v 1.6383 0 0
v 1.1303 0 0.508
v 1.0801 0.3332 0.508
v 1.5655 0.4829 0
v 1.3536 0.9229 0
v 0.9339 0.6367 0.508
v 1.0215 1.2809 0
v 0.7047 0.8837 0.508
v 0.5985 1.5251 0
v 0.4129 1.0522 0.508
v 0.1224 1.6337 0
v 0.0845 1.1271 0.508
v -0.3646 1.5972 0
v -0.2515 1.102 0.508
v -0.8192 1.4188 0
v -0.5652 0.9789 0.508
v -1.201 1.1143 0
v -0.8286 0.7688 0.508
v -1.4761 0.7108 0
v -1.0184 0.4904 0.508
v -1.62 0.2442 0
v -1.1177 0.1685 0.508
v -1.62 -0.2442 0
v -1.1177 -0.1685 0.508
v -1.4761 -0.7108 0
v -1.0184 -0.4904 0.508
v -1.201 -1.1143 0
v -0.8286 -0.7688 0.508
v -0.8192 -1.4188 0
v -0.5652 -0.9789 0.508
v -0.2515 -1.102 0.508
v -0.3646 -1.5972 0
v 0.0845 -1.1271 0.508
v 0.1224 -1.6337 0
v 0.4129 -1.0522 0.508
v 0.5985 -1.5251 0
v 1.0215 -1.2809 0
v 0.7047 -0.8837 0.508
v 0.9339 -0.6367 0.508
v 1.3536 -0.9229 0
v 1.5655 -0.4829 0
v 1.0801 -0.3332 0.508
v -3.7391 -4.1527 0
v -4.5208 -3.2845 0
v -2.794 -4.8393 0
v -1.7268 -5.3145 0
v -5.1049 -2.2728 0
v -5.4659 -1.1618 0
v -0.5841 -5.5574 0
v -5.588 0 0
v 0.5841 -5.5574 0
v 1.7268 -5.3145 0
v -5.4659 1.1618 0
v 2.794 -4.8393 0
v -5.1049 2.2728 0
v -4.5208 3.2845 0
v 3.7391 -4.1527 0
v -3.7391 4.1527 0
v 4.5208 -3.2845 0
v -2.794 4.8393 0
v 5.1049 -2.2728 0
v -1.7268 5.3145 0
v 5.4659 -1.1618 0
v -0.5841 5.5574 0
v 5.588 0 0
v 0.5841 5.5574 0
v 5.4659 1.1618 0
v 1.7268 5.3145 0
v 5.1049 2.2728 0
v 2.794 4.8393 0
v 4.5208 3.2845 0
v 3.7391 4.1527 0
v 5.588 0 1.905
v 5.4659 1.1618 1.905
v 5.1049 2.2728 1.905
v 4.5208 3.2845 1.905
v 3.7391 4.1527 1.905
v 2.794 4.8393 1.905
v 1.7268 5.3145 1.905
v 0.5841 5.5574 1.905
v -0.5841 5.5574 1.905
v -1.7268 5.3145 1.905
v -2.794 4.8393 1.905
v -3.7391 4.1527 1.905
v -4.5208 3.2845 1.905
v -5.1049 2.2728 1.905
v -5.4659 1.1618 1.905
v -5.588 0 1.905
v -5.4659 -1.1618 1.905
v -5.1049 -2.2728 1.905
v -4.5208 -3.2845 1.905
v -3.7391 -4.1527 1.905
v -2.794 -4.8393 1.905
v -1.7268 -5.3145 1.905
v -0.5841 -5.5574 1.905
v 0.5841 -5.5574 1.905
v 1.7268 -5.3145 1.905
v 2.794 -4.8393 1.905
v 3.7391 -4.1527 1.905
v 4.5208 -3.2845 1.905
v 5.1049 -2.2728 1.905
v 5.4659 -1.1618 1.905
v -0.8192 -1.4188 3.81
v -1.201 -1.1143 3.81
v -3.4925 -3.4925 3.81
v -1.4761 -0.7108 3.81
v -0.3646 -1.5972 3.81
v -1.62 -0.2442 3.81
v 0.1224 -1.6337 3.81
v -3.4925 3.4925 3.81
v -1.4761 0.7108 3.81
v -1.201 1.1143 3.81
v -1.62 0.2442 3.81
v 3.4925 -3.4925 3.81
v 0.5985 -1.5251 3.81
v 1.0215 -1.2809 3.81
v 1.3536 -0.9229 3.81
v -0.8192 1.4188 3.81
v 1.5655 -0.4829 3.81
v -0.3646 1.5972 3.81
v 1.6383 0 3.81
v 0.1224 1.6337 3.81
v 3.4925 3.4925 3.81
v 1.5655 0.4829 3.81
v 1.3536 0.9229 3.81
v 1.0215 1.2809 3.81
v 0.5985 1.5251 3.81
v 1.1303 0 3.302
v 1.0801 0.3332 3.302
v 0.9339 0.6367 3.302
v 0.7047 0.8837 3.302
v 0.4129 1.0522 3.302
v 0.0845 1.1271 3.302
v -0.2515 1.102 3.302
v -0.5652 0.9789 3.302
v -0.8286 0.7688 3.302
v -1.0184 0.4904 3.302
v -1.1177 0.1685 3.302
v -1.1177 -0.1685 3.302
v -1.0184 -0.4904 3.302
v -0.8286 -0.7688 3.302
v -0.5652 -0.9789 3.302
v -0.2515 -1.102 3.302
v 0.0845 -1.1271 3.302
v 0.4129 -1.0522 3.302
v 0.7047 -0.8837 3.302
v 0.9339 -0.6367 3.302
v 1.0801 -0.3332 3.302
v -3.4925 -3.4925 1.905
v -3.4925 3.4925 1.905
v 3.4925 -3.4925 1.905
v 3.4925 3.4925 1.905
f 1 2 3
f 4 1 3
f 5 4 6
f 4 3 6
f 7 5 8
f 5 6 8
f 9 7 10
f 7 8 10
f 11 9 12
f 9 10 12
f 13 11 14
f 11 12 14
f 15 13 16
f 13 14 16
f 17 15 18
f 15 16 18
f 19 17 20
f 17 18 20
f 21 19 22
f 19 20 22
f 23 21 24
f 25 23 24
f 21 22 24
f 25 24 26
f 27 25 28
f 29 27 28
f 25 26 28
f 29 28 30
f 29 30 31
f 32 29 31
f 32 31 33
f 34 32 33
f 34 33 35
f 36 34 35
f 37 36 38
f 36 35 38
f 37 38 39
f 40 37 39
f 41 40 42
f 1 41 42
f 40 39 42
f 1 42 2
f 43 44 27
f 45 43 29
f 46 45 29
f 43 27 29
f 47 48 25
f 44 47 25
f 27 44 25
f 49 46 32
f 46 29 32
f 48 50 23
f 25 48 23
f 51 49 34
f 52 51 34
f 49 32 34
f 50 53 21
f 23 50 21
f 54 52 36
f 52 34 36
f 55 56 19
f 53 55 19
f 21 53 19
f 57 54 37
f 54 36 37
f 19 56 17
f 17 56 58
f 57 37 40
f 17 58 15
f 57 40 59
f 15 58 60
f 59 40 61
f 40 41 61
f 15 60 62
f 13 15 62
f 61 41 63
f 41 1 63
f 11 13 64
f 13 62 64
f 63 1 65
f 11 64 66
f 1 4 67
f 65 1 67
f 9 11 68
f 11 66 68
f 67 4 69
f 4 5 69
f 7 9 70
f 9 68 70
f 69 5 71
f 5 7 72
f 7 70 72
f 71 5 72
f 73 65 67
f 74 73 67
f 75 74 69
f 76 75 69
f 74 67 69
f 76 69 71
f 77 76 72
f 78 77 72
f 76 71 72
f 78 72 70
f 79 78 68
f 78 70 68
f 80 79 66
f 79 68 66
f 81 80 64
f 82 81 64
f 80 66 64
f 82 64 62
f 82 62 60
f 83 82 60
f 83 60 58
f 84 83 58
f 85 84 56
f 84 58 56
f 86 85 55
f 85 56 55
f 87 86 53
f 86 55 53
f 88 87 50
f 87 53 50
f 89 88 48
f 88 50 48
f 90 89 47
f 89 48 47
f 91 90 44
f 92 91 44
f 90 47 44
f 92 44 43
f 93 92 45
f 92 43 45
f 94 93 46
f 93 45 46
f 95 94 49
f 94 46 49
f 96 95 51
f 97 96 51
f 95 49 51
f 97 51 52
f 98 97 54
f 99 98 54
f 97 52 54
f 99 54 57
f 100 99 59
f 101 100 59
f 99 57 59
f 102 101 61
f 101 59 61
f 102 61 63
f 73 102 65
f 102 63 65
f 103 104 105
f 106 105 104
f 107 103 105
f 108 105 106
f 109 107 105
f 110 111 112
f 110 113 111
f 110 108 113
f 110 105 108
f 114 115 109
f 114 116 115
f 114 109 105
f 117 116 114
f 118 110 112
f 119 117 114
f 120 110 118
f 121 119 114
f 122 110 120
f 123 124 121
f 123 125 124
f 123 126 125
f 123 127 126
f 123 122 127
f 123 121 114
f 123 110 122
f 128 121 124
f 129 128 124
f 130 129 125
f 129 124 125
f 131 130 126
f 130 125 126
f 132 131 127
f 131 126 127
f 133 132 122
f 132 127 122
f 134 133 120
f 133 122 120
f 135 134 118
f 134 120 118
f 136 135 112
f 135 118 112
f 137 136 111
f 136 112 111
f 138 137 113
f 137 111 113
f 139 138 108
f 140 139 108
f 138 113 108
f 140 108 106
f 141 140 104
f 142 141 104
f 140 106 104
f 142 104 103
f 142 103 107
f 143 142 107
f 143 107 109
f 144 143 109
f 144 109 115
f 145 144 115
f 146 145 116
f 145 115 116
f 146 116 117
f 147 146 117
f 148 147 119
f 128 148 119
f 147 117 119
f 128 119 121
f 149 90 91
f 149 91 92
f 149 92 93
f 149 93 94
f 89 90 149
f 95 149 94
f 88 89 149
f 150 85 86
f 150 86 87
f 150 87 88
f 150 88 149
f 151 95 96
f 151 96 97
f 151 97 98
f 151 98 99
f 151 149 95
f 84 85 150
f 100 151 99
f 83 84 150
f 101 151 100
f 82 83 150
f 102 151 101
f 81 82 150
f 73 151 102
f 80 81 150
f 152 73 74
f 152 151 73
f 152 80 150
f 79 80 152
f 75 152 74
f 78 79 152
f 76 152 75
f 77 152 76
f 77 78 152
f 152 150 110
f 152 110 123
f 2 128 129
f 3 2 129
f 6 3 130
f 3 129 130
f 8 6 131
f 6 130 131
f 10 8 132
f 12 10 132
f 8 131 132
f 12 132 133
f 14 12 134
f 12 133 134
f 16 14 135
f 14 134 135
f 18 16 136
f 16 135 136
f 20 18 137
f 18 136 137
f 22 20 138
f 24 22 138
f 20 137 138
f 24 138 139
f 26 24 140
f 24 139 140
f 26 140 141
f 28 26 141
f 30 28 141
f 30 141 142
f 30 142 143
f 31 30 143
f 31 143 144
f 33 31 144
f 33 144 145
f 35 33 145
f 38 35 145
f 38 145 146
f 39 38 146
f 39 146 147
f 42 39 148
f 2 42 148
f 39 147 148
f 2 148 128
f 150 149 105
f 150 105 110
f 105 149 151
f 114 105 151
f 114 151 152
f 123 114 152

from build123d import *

# Parameters (mm, degrees)
F0_R     = 5.588
F1_DEPTH = 1.905
F2_W     = 6.985
F2_H     = 6.985
F3_DEPTH = 1.905
F4_R     = 1.1303
F5_DEPTH = 3.81
F6_SIZE  = 0.508


with BuildPart() as f1:
    # F0 (on Top) → F1 (new body)
    with BuildSketch(Plane.XY):
        Circle(F0_R)
    extrude(amount=F1_DEPTH)

    # F2 (on face) → F3 (join)
    with BuildSketch(Plane.XY.offset(1.905)):
        Rectangle(F2_W, F2_H)
    extrude(amount=F3_DEPTH)

    # F4 (on face) → F5 (cut, through all)
    with BuildSketch(Plane.XY.offset(3.81)):
        Circle(F4_R)
    extrude(amount=-F5_DEPTH, mode=Mode.SUBTRACT)

    # F6
    f6_edges = [f1.edges().sort_by_distance(p)[0] for p in [
        (1.1303, 0, 1.905),
        (-1.1303, 0, 3.81),
        (-1.1303, 0, 0),
    ]]
    chamfer(f6_edges, length=F6_SIZE)


solid = f1.part
